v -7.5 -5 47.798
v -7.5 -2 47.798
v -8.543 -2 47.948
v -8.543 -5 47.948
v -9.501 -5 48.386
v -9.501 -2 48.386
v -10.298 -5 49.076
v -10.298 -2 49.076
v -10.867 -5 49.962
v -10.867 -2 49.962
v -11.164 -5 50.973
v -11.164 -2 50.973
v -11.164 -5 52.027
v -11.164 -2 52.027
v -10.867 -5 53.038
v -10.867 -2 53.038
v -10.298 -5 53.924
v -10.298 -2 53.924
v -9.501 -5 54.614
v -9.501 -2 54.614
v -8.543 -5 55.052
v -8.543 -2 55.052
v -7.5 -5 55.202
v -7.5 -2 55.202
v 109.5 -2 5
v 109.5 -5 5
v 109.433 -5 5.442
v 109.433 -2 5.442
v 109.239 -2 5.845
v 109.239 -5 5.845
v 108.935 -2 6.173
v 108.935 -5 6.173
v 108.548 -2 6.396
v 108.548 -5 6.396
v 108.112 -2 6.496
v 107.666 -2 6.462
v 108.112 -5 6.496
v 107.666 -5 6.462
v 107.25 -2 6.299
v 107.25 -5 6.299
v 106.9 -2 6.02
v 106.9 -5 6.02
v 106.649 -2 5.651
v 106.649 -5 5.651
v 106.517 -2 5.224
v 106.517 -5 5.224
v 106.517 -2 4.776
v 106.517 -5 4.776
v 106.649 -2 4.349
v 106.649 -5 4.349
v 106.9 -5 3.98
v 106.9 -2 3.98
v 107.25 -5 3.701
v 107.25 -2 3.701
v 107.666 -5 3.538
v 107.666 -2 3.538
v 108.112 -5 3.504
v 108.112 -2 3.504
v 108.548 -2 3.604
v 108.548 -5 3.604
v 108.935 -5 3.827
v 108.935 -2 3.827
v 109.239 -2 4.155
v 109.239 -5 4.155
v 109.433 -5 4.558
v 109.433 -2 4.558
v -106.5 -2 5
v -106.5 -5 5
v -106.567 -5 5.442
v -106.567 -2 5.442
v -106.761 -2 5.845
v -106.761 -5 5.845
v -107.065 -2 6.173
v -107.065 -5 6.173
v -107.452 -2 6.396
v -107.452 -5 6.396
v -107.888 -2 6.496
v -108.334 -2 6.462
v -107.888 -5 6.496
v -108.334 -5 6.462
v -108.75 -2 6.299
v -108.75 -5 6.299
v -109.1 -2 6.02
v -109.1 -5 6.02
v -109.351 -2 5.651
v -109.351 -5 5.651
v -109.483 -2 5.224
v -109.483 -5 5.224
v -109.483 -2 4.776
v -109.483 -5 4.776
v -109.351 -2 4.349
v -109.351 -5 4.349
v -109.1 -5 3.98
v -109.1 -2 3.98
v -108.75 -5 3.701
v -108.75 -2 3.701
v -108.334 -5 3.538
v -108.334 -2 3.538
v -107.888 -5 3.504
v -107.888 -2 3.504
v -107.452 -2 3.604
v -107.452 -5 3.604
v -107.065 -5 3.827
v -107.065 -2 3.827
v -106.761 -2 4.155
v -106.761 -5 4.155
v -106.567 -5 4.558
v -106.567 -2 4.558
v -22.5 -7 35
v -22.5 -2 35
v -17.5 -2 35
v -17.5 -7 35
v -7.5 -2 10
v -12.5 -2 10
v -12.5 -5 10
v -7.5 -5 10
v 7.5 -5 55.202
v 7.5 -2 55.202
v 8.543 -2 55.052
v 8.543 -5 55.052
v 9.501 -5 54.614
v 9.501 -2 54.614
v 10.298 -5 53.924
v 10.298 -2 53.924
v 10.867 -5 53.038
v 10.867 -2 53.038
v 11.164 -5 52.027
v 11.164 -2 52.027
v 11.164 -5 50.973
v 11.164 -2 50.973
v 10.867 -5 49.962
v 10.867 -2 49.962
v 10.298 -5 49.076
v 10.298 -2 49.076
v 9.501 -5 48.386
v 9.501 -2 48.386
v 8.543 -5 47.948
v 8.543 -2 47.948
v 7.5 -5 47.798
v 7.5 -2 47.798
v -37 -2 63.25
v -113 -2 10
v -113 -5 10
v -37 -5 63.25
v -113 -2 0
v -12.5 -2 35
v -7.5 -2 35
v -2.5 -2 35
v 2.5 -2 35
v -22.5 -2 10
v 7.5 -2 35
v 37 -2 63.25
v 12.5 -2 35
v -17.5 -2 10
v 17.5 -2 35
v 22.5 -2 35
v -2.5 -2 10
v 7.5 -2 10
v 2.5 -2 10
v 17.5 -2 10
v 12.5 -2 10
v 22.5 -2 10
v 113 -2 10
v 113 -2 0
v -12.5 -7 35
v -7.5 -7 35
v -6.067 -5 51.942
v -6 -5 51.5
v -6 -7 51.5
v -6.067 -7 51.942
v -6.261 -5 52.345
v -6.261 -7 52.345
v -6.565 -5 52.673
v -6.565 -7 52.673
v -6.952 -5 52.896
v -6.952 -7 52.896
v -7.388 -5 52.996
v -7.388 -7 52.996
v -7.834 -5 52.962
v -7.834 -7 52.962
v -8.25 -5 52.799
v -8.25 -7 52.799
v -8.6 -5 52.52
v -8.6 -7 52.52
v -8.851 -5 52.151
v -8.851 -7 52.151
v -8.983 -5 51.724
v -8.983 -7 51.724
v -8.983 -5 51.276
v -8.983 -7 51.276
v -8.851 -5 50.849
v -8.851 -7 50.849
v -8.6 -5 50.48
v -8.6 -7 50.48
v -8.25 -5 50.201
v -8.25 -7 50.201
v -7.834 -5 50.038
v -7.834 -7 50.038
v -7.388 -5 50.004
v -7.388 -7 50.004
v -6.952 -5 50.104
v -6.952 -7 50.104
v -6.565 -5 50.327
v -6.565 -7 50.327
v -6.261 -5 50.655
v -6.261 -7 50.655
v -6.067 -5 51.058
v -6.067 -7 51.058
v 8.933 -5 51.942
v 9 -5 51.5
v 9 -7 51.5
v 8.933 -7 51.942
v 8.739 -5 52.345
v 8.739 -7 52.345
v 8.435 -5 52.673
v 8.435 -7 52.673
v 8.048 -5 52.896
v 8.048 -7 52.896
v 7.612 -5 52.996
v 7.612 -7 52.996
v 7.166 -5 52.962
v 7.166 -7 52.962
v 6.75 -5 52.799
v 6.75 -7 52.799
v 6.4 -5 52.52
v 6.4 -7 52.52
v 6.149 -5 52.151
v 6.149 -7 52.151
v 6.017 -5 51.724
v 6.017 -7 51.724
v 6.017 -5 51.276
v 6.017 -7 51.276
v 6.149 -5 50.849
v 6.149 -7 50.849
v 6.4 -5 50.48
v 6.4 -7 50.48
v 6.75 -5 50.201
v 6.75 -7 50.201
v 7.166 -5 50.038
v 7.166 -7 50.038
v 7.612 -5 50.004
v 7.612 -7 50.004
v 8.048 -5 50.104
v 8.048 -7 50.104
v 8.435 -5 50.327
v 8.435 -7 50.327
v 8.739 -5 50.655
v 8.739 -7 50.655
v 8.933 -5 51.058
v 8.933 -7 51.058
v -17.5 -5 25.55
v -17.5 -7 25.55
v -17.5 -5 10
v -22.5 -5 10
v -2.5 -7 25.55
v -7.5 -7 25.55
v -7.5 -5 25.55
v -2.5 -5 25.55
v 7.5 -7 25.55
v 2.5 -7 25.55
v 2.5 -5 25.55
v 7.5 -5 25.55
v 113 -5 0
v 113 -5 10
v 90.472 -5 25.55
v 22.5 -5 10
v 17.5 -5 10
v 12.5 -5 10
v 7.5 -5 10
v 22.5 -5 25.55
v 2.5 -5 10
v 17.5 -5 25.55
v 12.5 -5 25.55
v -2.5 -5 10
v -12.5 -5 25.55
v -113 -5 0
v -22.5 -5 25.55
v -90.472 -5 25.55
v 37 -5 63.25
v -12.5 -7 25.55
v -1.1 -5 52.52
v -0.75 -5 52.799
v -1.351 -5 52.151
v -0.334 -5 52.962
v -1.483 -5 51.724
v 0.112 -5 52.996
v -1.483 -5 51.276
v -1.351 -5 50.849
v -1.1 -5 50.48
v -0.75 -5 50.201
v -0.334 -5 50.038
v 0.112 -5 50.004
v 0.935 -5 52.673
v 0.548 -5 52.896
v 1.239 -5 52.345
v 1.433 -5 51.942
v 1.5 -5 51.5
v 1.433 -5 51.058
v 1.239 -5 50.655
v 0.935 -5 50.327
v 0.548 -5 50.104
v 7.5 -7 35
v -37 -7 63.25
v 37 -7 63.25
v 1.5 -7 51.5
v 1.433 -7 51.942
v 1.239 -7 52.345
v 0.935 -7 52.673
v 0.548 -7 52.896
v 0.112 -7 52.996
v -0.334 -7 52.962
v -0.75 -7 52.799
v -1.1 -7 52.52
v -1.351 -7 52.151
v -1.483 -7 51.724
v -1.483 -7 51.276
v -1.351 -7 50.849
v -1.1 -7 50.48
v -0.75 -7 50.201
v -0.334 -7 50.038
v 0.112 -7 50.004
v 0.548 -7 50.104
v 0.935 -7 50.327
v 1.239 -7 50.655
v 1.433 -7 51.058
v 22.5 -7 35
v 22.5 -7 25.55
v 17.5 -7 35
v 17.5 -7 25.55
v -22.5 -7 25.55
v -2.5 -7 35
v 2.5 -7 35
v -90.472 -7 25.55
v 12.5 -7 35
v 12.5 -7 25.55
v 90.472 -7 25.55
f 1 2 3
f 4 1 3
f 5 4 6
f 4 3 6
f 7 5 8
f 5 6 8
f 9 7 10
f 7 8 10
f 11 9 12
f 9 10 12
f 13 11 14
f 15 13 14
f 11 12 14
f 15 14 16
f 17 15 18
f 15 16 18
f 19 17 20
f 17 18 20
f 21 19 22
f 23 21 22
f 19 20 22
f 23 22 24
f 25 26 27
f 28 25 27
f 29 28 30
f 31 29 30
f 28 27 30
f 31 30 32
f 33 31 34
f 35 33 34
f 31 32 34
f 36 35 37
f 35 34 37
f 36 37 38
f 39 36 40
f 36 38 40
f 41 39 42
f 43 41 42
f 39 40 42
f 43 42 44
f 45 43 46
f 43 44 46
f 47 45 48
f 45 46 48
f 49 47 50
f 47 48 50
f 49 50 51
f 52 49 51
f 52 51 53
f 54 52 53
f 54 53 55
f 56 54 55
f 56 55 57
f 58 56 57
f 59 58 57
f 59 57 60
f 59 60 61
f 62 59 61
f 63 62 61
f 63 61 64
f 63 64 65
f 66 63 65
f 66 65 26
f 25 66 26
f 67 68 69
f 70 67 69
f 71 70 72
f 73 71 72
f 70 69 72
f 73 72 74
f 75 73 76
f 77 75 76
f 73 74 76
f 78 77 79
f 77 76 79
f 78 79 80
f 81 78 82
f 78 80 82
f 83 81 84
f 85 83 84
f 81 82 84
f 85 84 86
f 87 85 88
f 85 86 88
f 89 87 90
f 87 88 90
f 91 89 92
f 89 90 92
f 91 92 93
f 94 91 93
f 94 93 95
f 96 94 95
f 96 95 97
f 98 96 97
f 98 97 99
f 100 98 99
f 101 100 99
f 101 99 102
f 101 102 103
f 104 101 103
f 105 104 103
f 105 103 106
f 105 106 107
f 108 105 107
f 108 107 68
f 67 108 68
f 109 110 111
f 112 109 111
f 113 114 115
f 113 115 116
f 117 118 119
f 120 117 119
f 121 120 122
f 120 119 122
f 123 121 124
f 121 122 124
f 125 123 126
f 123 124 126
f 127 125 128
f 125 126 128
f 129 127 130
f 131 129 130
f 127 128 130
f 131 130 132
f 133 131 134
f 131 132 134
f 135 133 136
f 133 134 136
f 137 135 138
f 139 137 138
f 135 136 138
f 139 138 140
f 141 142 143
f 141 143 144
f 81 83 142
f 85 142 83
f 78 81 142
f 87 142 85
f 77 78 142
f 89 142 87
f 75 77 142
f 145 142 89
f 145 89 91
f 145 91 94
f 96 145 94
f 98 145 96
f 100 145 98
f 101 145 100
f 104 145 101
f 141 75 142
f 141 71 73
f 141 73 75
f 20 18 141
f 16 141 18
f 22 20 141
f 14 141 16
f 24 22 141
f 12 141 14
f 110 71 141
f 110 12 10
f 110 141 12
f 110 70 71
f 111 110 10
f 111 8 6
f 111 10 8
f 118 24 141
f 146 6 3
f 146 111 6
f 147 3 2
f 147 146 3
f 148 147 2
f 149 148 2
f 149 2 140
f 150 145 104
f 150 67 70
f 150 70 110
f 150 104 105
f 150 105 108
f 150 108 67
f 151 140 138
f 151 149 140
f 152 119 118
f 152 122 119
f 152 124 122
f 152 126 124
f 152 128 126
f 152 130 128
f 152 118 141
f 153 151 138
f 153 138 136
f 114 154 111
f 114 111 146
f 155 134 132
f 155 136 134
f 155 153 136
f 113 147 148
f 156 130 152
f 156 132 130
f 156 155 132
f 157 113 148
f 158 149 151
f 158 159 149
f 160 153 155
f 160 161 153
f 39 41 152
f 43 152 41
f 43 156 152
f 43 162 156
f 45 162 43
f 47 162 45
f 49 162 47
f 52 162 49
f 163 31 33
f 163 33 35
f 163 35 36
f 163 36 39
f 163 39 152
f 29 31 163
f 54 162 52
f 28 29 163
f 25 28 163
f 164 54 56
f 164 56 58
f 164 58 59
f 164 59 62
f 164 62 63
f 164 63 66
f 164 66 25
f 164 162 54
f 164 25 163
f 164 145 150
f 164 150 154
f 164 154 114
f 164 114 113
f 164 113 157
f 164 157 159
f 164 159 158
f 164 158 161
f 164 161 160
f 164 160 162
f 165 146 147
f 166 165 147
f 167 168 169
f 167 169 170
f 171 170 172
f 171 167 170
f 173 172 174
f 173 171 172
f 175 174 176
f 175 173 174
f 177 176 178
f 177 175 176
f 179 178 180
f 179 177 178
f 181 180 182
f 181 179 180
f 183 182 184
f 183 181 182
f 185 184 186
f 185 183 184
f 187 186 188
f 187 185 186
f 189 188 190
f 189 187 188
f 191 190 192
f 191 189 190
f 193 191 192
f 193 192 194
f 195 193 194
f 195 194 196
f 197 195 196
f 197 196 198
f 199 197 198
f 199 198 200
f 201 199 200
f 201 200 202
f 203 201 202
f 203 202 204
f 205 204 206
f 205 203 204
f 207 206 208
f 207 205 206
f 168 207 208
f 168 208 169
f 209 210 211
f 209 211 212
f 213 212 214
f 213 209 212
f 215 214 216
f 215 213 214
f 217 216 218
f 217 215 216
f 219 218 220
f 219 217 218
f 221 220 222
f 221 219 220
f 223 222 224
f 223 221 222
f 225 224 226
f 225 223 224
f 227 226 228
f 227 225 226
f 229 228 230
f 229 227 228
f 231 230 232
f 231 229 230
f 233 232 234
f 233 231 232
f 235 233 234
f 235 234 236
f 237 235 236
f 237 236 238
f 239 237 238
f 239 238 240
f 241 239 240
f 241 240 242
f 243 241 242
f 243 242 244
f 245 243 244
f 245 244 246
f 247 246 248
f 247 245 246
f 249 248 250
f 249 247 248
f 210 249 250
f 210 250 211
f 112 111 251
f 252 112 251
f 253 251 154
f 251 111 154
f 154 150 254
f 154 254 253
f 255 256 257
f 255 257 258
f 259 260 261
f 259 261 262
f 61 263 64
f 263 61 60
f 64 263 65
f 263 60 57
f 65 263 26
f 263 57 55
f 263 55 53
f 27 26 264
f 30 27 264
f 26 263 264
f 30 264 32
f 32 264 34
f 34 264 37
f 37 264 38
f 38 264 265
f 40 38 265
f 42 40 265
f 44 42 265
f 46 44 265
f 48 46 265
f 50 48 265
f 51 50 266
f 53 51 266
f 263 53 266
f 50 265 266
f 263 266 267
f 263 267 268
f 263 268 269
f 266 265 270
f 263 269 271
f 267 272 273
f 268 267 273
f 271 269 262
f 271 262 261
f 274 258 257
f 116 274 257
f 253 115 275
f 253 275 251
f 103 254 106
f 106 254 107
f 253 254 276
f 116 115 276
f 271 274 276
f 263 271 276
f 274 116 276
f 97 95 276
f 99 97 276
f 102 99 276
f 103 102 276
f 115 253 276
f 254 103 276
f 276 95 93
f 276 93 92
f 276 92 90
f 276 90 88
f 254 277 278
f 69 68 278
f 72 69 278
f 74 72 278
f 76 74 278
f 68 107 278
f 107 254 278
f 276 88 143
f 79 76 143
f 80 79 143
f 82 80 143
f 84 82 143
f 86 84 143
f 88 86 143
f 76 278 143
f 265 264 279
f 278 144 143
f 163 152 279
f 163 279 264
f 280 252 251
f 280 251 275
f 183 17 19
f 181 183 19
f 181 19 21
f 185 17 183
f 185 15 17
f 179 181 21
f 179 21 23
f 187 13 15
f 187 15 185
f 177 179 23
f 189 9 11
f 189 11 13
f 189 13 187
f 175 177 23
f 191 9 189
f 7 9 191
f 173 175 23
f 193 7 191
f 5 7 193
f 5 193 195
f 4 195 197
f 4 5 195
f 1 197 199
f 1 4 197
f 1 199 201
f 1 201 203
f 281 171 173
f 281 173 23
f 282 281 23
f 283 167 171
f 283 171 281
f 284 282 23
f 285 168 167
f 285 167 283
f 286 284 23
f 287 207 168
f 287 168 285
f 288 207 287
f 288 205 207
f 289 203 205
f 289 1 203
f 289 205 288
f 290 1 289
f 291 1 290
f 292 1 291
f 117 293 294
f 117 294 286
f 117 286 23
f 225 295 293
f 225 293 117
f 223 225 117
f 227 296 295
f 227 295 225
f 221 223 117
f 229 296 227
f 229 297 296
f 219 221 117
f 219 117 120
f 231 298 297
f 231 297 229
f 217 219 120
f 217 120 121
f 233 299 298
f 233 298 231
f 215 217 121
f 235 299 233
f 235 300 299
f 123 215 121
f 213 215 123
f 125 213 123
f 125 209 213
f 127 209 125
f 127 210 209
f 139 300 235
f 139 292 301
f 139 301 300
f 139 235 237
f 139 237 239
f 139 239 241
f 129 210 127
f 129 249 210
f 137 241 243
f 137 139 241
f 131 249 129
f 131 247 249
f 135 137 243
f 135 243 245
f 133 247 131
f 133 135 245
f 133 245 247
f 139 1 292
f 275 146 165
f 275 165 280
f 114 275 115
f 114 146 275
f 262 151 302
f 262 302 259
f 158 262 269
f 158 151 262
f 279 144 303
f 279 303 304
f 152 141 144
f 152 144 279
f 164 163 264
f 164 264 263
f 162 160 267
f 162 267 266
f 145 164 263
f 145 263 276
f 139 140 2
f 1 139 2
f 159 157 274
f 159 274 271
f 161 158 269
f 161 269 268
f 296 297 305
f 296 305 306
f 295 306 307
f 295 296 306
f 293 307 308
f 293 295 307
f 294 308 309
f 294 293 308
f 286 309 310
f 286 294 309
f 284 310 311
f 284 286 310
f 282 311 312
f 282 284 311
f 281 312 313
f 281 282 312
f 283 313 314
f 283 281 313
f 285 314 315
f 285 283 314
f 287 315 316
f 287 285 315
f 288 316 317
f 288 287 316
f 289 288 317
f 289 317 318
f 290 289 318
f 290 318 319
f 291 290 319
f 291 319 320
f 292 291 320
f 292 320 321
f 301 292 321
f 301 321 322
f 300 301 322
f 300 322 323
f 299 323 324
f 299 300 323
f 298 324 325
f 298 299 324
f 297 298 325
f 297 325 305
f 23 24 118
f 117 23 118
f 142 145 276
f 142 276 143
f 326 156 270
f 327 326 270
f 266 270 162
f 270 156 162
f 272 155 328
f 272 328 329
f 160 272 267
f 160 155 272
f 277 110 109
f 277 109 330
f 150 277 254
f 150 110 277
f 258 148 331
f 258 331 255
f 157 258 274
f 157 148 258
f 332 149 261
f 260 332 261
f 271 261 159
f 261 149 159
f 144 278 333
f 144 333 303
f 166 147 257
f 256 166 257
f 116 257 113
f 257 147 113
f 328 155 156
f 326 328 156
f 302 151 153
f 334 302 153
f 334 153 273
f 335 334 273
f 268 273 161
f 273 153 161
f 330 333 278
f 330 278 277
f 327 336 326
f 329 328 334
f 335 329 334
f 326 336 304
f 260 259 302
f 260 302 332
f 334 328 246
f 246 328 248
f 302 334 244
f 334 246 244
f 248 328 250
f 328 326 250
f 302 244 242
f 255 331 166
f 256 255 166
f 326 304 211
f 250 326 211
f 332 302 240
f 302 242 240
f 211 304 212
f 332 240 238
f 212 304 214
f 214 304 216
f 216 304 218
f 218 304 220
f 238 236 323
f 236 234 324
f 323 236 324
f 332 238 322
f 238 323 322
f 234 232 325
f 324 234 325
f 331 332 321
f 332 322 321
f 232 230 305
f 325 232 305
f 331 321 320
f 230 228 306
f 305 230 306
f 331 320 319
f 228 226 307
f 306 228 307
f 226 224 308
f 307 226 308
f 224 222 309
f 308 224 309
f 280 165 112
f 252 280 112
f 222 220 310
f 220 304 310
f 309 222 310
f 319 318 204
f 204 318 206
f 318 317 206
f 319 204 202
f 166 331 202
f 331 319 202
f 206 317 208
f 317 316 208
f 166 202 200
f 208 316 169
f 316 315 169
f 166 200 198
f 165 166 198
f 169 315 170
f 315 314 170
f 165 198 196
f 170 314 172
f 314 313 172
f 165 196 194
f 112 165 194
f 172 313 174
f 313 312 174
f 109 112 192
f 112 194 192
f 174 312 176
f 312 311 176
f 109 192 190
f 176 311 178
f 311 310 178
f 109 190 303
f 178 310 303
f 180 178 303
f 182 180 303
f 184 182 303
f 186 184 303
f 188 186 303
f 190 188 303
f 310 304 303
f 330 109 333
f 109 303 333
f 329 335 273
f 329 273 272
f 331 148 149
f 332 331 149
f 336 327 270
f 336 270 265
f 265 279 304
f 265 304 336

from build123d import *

# Parameters (mm, degrees)
PAD_DEPTH       = 5
SKETCH001_R     = 1.5
POCKET_DEPTH    = 5.001
SKETCH002_R     = 1.5
PAD001_DEPTH    = 2
POCKET001_DEPTH = 5
SKETCH004_W     = 5
SKETCH004_H     = 25
POCKET002_DEPTH = 7.001
SKETCH005_W     = 243.085243
SKETCH005_H     = 32.517023
POCKET003_DEPTH = 2
SKETCH006_W     = 324.151733
SKETCH006_H     = 177.952698
POCKET004_DEPTH = 2


with BuildPart() as part:
    # Sketch → Pad (new body)
    with BuildSketch(Plane.XZ):
        Polygon((-37, 63.25), (37, 63.25), (113, 10), (113, 0), (-113, 0), (-113, 10), align=None)
    extrude(amount=PAD_DEPTH)

    # Sketch001 (on Face8 of Pad) → Pocket (cut, through all)
    with BuildSketch(Plane.XZ.offset(5)):
        with Locations((-108, 5)):
            Circle(SKETCH001_R)
        with Locations((108, 5)):
            Circle(SKETCH001_R)
        with Locations((-7.5, 51.5)):
            Circle(SKETCH001_R)
        with Locations((0, 51.5)):
            Circle(SKETCH001_R)
        with Locations((7.5, 51.5)):
            Circle(SKETCH001_R)
    extrude(amount=-POCKET_DEPTH, mode=Mode.SUBTRACT)

    # Sketch002 (on Face5 of Pocket) → Pad001 (join)
    with BuildSketch(Plane.XZ.offset(5)):
        Polygon((-37, 63.25), (37, 63.25), (104.655786, 15.55), (-104.655786, 15.55), align=None)
        with Locations((-7.5, 51.5)):
            Circle(SKETCH002_R, mode=Mode.SUBTRACT)
        with Locations((0, 51.5)):
            Circle(SKETCH002_R, mode=Mode.SUBTRACT)
        with Locations((7.5, 51.5)):
            Circle(SKETCH002_R, mode=Mode.SUBTRACT)
    extrude(amount=PAD001_DEPTH)

    # Sketch003 (on Face4 of Pad001) → Pocket001 (cut)
    with BuildSketch(Plane(origin=(0, 0, 0), x_dir=(1, 0, 0), z_dir=(0, 1, 0))):
        with BuildLine():
            ThreePointArc((-7.5, -47.798047), (-11.201953, -51.5), (-7.5, -55.201953))
            Line((-7.5, -55.201953), (7.5, -55.201953))
            ThreePointArc((7.5, -55.201953), (11.201953, -51.5), (7.5, -47.798047))
            Line((7.5, -47.798047), (-7.5, -47.798047))
        make_face()
    extrude(amount=-POCKET001_DEPTH, mode=Mode.SUBTRACT)

    # Sketch004 (on Face4 of Pocket001) → Pocket002 (cut, through all)
    with BuildSketch(Plane(origin=(0, 0, 0), x_dir=(1, 0, 0), z_dir=(0, 1, 0))):
        with Locations((-20, -22.5)):
            Rectangle(SKETCH004_W, SKETCH004_H)
        with Locations((0, -22.5)):
            Rectangle(SKETCH004_W, SKETCH004_H)
        with Locations((10, -22.5)):
            Rectangle(SKETCH004_W, SKETCH004_H)
        with Locations((20, -22.5)):
            Rectangle(SKETCH004_W, SKETCH004_H)
        with Locations((-10, -22.5)):
            Rectangle(SKETCH004_W, SKETCH004_H)
    extrude(amount=-POCKET002_DEPTH, mode=Mode.SUBTRACT)

    # Sketch005 (on Face38 of Pocket002) → Pocket003 (cut)
    with BuildSketch(Plane.XZ.offset(7)):
        with Locations((0.109928, 9.291488)):
            Rectangle(SKETCH005_W, SKETCH005_H)
    extrude(amount=-POCKET003_DEPTH, mode=Mode.SUBTRACT)

    # Sketch006 (on Face4 of Pocket003) → Pocket004 (cut)
    with BuildSketch(Plane(origin=(0, 0, 0), x_dir=(1, 0, 0), z_dir=(0, 1, 0))):
        with Locations((27.792465, -47.893646)):
            Rectangle(SKETCH006_W, SKETCH006_H)
    extrude(amount=-POCKET004_DEPTH, mode=Mode.SUBTRACT)


solid = part.part
